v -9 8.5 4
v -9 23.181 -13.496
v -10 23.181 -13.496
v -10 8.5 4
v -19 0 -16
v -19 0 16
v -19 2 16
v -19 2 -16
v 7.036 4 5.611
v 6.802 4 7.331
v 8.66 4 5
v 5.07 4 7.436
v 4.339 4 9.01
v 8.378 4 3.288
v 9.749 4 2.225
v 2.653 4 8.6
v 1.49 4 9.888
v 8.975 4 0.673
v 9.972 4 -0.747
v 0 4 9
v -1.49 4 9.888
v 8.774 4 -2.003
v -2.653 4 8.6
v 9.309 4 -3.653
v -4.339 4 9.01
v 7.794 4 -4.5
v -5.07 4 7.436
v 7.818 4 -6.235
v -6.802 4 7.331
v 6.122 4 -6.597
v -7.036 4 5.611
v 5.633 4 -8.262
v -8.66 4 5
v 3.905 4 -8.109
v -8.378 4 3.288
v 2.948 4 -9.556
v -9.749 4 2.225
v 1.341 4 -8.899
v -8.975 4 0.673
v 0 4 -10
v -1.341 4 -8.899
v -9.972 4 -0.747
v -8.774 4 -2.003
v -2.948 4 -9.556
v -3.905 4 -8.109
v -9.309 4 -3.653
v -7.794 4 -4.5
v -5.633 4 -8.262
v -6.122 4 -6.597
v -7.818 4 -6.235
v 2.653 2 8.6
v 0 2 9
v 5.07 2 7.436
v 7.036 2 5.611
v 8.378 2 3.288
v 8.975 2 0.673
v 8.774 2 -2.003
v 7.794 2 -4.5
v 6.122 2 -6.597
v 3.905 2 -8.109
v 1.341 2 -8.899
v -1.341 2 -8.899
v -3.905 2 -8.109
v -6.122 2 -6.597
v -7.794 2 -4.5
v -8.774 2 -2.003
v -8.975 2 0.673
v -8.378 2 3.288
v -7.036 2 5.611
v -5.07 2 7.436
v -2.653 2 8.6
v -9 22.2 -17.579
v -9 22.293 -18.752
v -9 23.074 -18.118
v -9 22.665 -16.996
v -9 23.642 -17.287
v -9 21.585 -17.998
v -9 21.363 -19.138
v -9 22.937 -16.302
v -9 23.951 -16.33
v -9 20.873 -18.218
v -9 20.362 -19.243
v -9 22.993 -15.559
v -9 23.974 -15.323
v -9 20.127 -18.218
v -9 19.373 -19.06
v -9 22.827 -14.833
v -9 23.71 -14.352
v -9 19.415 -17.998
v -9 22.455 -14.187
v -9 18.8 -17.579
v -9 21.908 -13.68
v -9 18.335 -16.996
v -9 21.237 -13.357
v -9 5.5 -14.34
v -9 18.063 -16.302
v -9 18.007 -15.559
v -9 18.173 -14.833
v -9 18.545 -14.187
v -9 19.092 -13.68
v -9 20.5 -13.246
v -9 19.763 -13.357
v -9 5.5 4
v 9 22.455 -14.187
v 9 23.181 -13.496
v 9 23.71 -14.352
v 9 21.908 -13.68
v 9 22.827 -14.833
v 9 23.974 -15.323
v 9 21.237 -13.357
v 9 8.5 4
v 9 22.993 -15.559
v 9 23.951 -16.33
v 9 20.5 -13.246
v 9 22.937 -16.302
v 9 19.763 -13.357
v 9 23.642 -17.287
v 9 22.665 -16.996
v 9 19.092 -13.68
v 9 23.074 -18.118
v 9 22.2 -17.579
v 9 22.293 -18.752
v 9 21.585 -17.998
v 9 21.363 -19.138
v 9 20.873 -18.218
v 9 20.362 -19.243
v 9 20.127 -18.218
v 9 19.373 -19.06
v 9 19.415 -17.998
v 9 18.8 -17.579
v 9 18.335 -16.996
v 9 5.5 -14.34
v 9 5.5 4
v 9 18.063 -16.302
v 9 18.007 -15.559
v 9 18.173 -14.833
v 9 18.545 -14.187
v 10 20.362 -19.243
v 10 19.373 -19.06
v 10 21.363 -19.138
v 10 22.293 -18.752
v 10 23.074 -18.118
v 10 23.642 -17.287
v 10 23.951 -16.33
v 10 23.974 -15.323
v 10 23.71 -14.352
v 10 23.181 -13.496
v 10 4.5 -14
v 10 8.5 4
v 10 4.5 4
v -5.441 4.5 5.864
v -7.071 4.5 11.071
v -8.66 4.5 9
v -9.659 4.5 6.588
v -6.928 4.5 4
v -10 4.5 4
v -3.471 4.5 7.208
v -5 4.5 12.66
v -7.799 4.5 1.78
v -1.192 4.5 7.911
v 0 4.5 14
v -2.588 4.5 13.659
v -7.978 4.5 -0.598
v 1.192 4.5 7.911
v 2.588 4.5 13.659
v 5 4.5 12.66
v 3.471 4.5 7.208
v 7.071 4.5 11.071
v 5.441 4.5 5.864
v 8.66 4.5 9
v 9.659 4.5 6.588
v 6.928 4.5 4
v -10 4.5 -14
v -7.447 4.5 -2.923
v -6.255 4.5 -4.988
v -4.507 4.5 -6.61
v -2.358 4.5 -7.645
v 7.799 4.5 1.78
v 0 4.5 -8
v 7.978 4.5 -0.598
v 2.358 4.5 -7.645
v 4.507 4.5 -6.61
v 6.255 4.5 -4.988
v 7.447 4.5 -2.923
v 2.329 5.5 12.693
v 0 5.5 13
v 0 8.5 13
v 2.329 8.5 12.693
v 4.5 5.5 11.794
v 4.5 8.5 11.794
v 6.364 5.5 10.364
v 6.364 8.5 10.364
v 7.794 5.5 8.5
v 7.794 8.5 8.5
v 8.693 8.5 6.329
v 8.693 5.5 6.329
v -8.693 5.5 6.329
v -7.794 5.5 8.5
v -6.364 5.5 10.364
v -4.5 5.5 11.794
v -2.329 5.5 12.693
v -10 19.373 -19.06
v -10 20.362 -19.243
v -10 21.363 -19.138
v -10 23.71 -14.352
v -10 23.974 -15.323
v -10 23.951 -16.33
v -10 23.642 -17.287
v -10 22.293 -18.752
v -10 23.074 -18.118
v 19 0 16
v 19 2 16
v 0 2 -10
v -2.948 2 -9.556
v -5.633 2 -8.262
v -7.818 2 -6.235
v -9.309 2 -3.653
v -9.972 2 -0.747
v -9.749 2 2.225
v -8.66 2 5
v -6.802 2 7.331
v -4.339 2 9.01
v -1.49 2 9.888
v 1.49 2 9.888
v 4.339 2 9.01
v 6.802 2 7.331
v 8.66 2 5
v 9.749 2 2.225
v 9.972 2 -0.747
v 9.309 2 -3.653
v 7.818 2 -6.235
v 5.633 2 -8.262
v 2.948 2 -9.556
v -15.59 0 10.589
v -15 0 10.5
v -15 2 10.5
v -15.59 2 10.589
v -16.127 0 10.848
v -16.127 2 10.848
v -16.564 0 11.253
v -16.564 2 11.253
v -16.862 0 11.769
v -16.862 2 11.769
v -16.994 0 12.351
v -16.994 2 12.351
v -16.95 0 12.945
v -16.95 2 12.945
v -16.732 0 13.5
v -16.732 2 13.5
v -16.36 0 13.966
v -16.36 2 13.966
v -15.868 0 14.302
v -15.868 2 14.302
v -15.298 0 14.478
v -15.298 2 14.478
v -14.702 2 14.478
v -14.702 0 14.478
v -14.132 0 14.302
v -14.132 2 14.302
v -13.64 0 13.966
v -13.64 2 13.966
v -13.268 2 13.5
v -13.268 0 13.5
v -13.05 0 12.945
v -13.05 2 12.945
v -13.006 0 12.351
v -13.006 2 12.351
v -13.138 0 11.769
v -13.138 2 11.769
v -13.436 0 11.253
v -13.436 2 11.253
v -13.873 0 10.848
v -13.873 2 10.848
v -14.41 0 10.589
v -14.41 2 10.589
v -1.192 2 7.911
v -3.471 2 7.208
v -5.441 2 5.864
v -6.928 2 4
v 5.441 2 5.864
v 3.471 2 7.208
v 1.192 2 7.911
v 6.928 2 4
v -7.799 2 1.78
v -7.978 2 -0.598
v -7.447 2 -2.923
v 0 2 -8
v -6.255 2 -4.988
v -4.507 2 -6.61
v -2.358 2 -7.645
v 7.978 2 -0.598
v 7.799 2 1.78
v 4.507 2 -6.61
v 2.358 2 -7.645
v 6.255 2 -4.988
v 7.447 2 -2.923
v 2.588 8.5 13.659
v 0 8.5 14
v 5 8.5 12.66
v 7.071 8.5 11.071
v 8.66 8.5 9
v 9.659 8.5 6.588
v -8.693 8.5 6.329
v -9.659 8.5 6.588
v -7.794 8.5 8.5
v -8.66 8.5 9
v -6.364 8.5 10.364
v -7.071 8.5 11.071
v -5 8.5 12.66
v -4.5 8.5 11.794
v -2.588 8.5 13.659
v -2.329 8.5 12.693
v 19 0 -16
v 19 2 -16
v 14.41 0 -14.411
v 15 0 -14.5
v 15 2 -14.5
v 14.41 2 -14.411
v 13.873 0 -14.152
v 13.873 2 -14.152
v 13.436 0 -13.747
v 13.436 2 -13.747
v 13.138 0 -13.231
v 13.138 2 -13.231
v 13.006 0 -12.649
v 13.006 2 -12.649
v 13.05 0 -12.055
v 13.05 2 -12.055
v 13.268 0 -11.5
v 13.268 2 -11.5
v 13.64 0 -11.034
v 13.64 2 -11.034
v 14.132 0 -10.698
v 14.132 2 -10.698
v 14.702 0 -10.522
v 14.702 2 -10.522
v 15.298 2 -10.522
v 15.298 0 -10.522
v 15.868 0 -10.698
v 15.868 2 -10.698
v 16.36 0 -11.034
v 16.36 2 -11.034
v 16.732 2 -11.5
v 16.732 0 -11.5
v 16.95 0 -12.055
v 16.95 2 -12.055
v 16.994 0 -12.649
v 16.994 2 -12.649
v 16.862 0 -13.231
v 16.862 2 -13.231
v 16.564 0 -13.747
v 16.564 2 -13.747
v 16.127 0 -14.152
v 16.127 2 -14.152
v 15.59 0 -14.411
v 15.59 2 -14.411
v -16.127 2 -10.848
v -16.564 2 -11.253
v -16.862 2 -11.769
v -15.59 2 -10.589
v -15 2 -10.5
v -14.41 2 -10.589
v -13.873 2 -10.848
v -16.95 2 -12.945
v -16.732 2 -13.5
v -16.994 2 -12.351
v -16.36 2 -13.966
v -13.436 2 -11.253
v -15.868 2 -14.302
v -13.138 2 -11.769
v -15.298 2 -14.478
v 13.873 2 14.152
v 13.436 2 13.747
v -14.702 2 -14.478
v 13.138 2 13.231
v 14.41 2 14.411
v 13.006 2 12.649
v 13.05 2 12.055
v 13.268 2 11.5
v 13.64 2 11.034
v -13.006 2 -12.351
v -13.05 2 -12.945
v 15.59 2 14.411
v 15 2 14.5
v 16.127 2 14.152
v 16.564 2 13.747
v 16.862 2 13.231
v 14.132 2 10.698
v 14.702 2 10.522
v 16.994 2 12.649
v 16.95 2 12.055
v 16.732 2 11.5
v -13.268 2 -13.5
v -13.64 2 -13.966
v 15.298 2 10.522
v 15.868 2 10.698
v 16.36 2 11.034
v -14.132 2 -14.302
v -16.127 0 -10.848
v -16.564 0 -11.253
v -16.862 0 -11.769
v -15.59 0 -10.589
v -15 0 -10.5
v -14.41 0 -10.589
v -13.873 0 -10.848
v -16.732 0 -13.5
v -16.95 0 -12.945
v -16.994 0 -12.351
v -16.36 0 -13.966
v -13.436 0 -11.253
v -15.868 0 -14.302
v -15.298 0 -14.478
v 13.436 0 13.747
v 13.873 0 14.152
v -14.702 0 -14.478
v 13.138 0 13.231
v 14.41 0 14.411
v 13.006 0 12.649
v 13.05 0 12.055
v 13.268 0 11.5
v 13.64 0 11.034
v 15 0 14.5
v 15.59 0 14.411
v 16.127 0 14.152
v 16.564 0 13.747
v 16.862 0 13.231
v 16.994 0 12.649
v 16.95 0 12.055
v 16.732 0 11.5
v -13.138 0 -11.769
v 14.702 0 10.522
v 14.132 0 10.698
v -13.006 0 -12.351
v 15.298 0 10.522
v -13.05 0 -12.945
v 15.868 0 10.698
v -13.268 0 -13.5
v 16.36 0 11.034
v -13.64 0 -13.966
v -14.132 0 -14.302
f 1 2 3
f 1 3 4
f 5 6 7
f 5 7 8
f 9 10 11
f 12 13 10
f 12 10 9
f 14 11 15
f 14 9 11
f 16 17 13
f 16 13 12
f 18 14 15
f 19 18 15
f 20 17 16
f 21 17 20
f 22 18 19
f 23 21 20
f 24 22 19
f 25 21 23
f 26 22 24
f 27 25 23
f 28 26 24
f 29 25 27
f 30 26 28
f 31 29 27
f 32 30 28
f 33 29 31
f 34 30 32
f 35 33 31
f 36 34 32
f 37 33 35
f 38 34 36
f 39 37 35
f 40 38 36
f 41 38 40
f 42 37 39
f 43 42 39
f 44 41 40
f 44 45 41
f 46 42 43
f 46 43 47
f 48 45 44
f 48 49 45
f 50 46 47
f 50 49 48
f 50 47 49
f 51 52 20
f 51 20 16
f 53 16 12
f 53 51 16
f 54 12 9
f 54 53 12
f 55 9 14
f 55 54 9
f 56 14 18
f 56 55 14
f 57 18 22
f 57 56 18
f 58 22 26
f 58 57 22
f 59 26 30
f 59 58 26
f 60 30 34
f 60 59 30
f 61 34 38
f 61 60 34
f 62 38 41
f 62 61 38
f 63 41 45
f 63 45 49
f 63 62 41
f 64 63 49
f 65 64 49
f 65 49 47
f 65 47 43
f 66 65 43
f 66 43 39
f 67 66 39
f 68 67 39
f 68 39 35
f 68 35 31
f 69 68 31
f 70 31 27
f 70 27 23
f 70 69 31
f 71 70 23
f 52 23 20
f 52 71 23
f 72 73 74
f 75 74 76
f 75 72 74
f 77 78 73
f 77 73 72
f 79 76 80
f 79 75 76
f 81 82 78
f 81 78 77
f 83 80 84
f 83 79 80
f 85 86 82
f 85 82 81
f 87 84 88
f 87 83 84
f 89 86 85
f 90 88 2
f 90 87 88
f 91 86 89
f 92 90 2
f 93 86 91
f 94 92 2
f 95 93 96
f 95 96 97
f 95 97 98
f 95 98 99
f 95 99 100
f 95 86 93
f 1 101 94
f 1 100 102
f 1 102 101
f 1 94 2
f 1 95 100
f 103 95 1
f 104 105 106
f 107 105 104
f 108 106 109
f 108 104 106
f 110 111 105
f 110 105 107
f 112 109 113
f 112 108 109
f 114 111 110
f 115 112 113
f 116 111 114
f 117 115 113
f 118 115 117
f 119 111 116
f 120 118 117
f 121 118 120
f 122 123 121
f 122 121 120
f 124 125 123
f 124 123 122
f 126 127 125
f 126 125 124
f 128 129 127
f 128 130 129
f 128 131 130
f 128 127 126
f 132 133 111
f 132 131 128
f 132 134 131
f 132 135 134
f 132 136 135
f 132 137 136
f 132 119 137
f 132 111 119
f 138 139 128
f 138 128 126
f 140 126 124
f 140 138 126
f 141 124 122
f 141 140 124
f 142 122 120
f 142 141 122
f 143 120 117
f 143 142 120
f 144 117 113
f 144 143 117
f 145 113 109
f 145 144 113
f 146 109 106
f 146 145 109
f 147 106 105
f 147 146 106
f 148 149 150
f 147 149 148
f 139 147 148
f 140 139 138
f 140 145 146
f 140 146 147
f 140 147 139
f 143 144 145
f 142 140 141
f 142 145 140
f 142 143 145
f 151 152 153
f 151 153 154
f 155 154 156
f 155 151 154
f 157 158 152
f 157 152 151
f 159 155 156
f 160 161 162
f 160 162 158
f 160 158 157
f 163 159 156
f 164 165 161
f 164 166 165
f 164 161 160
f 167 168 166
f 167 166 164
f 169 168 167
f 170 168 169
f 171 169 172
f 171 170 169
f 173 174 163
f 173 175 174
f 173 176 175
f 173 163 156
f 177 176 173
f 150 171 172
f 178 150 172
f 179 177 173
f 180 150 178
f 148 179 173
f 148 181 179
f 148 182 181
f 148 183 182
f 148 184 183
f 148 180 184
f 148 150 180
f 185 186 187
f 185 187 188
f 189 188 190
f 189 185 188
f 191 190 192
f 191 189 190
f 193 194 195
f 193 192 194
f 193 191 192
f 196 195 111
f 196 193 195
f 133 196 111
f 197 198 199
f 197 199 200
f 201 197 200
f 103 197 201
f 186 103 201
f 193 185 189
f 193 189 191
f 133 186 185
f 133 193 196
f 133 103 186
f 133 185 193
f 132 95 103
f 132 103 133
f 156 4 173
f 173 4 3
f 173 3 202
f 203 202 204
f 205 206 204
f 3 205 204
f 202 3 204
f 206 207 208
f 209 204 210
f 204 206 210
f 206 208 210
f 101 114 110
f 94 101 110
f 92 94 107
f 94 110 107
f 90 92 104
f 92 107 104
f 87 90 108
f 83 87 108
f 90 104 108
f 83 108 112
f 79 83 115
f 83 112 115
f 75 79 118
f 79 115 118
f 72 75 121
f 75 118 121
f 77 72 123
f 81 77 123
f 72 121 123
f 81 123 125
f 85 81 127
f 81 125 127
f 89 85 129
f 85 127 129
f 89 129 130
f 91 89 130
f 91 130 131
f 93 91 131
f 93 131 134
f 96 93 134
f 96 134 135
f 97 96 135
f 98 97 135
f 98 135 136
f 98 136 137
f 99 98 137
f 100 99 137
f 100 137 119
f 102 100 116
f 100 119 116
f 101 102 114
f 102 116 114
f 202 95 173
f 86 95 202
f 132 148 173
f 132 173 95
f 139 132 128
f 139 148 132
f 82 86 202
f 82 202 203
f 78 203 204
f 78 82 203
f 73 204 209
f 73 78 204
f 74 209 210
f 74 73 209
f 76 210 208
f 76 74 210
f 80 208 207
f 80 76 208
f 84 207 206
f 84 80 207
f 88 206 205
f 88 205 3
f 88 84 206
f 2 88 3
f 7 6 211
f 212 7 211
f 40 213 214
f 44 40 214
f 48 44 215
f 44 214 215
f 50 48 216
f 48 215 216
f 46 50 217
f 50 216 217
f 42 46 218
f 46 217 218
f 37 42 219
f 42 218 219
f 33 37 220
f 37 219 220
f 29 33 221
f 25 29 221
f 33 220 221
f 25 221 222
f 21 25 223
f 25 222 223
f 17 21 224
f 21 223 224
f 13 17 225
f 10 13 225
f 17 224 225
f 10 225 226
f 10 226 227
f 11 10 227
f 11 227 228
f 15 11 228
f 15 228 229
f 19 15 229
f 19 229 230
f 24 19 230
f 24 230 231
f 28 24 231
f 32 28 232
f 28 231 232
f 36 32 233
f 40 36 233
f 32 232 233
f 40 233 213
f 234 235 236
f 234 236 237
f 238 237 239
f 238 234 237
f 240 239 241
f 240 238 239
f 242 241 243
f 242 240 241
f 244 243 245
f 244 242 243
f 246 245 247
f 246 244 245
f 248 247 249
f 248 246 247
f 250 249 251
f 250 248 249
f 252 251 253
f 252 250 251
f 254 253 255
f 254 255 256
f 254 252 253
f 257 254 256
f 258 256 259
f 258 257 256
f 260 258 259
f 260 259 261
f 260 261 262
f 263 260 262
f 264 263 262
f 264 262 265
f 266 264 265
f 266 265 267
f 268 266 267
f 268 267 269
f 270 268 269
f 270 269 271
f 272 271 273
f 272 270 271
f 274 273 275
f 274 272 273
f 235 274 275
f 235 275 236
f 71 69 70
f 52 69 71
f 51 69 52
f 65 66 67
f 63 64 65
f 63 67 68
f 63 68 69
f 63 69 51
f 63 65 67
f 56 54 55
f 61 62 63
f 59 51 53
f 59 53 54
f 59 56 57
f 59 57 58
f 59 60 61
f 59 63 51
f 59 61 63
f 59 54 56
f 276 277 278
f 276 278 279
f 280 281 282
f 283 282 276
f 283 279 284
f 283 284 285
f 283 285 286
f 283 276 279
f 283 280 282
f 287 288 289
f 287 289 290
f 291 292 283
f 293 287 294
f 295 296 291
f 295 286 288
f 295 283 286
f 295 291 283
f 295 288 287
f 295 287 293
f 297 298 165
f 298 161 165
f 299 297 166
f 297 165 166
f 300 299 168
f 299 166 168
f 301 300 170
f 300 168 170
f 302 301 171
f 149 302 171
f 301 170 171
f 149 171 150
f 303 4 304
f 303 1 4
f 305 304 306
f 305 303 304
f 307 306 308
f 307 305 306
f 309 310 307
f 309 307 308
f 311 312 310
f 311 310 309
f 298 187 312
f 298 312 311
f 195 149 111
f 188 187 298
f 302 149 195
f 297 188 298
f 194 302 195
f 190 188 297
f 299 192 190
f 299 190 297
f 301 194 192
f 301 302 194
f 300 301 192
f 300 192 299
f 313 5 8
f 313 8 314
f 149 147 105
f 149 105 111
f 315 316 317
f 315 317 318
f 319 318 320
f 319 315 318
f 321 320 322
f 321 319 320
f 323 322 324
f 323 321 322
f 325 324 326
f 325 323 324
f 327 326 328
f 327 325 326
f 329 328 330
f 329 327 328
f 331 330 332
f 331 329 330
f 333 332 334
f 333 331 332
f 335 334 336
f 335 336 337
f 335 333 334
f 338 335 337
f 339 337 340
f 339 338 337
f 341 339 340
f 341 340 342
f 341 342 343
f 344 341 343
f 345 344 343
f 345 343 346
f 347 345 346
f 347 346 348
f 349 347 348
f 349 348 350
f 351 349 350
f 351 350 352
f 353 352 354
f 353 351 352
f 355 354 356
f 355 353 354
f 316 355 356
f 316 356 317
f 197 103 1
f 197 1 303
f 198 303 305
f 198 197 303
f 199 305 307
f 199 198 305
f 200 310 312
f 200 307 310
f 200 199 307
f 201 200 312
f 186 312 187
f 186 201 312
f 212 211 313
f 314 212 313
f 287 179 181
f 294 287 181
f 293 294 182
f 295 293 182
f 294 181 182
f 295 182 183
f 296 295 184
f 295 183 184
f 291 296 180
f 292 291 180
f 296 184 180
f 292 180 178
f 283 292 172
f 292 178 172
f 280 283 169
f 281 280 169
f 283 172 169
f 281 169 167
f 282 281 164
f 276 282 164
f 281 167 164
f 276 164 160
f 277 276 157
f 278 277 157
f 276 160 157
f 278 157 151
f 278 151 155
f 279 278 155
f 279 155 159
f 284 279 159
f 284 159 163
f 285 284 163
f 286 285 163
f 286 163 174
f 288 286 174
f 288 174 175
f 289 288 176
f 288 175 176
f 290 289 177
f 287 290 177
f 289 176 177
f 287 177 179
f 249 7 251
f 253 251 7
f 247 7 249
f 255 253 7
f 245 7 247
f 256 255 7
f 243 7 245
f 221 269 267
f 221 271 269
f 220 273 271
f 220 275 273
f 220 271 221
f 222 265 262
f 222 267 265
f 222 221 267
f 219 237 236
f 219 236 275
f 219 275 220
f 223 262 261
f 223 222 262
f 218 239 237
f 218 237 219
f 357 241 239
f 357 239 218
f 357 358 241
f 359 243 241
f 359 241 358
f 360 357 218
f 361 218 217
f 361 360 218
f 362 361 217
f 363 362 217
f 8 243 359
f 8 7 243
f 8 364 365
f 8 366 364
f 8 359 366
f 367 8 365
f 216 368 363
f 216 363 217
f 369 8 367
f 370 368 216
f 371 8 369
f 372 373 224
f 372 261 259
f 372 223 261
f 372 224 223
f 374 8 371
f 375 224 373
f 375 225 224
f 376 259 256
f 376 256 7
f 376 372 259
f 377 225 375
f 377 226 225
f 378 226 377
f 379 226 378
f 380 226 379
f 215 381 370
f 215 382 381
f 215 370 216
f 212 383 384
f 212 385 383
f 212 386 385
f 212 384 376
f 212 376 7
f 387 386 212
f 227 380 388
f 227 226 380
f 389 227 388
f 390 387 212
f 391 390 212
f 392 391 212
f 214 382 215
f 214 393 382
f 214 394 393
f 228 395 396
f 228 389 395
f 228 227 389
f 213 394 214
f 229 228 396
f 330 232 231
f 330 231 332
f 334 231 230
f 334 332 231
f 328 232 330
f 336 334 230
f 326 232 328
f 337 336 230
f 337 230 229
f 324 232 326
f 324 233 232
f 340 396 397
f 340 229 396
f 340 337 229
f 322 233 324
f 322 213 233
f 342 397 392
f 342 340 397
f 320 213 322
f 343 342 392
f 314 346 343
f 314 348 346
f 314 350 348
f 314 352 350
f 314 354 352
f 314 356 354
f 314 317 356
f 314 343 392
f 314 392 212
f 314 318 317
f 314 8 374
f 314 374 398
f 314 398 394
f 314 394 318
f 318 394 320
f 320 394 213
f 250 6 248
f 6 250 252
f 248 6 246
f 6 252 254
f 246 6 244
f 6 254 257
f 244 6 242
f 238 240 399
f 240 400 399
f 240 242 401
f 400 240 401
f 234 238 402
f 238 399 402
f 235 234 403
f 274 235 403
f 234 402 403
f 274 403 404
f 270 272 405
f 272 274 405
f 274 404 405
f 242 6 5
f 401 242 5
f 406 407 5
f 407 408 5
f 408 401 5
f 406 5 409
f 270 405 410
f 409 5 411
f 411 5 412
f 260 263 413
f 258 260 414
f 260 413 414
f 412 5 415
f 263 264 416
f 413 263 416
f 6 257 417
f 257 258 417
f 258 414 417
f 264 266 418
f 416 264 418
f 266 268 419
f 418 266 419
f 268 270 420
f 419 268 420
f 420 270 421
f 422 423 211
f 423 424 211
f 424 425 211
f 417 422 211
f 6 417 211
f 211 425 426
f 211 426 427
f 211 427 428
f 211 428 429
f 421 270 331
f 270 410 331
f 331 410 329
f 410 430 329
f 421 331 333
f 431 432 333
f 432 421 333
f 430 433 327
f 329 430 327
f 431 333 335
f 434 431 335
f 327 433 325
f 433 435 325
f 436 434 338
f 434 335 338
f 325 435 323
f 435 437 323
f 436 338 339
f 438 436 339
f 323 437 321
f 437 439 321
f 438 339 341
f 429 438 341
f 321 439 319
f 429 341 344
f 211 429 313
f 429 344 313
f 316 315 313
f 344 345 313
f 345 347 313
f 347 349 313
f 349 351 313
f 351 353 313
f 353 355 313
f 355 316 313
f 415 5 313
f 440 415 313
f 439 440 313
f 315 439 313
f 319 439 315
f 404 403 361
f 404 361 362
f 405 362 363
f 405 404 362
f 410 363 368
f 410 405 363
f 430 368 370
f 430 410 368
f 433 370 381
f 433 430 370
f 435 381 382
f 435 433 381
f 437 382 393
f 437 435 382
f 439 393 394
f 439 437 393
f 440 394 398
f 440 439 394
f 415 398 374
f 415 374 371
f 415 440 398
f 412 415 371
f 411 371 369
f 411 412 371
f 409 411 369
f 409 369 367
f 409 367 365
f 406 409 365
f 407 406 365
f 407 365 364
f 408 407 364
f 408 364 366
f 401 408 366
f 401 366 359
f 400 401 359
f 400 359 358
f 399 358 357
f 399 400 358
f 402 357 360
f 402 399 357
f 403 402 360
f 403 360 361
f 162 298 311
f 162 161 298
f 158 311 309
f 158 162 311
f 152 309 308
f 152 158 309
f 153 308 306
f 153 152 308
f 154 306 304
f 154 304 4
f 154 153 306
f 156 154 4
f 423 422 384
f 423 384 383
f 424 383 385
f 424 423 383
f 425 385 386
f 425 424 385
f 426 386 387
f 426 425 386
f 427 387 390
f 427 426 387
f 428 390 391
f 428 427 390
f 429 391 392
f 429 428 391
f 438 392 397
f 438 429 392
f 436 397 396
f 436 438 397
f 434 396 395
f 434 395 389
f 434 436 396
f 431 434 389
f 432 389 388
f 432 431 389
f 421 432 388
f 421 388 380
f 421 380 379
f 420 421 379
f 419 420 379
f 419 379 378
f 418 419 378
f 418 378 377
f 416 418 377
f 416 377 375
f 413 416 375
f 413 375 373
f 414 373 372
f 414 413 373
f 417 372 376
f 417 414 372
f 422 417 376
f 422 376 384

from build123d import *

# Parameters (mm, degrees)
SKETCH1_W               = 38
SKETCH1_H               = 32
SKETCH1_R               = 2
BOSS_EXTRUDE1_DEPTH     = 2
SKETCH2_R               = 10
SKETCH2_R_2             = 9
BOSS_EXTRUDE2_DEPTH     = 2
BOSS_EXTRUDE3_DEPTH     = 10
FILLET1_R               = 10
SHELL1_START            = 5.5
SHELL1_DEPTH            = 18.5
SKETCH5_R               = 8
BOSS_EXTRUDE4_DEPTH     = 2.5
BOSS_EXTRUDE5_START     = -19
BOSS_EXTRUDE5_OUTLINE_R = 2.5
BOSS_EXTRUDE5_DEPTH     = 18


# Read off the part's stored shape, not the designer's step: Shell1, Boss-Extrude5
with BuildPart() as part:
    # Sketch1 → Boss-Extrude1 (new body)
    with BuildSketch(Plane(origin=(0, 0, 0), x_dir=(1, 0, 0), z_dir=(0, 1, 0))):
        Rectangle(SKETCH1_W, SKETCH1_H)
        with Locations(Location((-15, 12.5, 0), (0, 0, 270))):
            Circle(SKETCH1_R, mode=Mode.SUBTRACT)
        with Locations(Location((15, 12.5, 0), (0, 0, 90))):
            Circle(SKETCH1_R, mode=Mode.SUBTRACT)
        with Locations(Location((-15, -12.5, 0), (0, 0, 90))):
            Circle(SKETCH1_R, mode=Mode.SUBTRACT)
        with Locations(Location((15, -12.5, 0), (0, 0, 270))):
            Circle(SKETCH1_R, mode=Mode.SUBTRACT)
    extrude(amount=BOSS_EXTRUDE1_DEPTH)

    # Sketch2 → Boss-Extrude2 (add)
    with BuildSketch(Plane(origin=(0, 2, 0), x_dir=(1, 0, 0), z_dir=(0, 1, 0))):
        with Locations(Location((0, 0, 0), (0, 0, 90))):
            Circle(SKETCH2_R)
        with Locations(Location((0, 0, 0), (0, 0, 270))):
            Circle(SKETCH2_R_2, mode=Mode.SUBTRACT)
    extrude(amount=BOSS_EXTRUDE2_DEPTH)


with BuildPart() as body_2:
    # Sketch4 → Boss-Extrude3 (new, symmetric)
    with BuildSketch(Plane(origin=(0, 0, 0), x_dir=(0, 0, -1), z_dir=(1, 0, 0))):
        with BuildLine():
            Line((-14, 4.5), (14, 4.5))
            Line((14, 4.5), (19.059587868, 19.372772229))
            ThreePointArc((19.059587868, 19.372772229), (17.72315501, 23.388106748), (13.496319871, 23.181155551))
            Line((13.496319871, 23.181155551), (-4, 8.5))
            Line((-4, 8.5), (-14, 8.5))
            Line((-14, 8.5), (-14, 4.5))
        make_face()
    extrude(amount=BOSS_EXTRUDE3_DEPTH, both=True)

    # Fillet1
    fillet1_edges = [body_2.edges().sort_by_distance(p)[0] for p in [
        (10, 6.5, 14),
        (-10, 6.5, 14),
    ]]
    fillet(fillet1_edges, radius=FILLET1_R - 0.0001)  # a hair under: the kernel refuses the full size

    # Shell1 outline → Shell1 (cut)
    with BuildSketch(Plane(origin=(0, 0, 0), x_dir=(1, 0, 0), z_dir=(0, 1, 0)).offset(SHELL1_START)):
        with BuildLine():
            ThreePointArc((0, -13), (6.363961031, -10.363961031), (9, -4))
            Line((9, -4), (9, 21))
            Line((9, 21), (-9, 21))
            Line((-9, 21), (-9, -4))
            ThreePointArc((-9, -4), (-6.363961031, -10.363961031), (0, -13))
        make_face()
    extrude(amount=SHELL1_DEPTH, mode=Mode.SUBTRACT)

    # Sketch5 → Boss-Extrude4 (add)
    with BuildSketch(Plane.XZ.offset(-4.5)):
        with Locations(Location((0, 0, 0), (0, 0, 270))):
            Circle(SKETCH5_R)
    extrude(amount=BOSS_EXTRUDE4_DEPTH)

    # Boss-Extrude5 outline → Boss-Extrude5 (add)
    with BuildSketch(Plane.ZY.offset(10).offset(BOSS_EXTRUDE5_START)):
        with Locations((-15.746076505, 20.5)):
            Circle(BOSS_EXTRUDE5_OUTLINE_R)
    extrude(amount=BOSS_EXTRUDE5_DEPTH)


solid = Compound([part.part, body_2.part])
